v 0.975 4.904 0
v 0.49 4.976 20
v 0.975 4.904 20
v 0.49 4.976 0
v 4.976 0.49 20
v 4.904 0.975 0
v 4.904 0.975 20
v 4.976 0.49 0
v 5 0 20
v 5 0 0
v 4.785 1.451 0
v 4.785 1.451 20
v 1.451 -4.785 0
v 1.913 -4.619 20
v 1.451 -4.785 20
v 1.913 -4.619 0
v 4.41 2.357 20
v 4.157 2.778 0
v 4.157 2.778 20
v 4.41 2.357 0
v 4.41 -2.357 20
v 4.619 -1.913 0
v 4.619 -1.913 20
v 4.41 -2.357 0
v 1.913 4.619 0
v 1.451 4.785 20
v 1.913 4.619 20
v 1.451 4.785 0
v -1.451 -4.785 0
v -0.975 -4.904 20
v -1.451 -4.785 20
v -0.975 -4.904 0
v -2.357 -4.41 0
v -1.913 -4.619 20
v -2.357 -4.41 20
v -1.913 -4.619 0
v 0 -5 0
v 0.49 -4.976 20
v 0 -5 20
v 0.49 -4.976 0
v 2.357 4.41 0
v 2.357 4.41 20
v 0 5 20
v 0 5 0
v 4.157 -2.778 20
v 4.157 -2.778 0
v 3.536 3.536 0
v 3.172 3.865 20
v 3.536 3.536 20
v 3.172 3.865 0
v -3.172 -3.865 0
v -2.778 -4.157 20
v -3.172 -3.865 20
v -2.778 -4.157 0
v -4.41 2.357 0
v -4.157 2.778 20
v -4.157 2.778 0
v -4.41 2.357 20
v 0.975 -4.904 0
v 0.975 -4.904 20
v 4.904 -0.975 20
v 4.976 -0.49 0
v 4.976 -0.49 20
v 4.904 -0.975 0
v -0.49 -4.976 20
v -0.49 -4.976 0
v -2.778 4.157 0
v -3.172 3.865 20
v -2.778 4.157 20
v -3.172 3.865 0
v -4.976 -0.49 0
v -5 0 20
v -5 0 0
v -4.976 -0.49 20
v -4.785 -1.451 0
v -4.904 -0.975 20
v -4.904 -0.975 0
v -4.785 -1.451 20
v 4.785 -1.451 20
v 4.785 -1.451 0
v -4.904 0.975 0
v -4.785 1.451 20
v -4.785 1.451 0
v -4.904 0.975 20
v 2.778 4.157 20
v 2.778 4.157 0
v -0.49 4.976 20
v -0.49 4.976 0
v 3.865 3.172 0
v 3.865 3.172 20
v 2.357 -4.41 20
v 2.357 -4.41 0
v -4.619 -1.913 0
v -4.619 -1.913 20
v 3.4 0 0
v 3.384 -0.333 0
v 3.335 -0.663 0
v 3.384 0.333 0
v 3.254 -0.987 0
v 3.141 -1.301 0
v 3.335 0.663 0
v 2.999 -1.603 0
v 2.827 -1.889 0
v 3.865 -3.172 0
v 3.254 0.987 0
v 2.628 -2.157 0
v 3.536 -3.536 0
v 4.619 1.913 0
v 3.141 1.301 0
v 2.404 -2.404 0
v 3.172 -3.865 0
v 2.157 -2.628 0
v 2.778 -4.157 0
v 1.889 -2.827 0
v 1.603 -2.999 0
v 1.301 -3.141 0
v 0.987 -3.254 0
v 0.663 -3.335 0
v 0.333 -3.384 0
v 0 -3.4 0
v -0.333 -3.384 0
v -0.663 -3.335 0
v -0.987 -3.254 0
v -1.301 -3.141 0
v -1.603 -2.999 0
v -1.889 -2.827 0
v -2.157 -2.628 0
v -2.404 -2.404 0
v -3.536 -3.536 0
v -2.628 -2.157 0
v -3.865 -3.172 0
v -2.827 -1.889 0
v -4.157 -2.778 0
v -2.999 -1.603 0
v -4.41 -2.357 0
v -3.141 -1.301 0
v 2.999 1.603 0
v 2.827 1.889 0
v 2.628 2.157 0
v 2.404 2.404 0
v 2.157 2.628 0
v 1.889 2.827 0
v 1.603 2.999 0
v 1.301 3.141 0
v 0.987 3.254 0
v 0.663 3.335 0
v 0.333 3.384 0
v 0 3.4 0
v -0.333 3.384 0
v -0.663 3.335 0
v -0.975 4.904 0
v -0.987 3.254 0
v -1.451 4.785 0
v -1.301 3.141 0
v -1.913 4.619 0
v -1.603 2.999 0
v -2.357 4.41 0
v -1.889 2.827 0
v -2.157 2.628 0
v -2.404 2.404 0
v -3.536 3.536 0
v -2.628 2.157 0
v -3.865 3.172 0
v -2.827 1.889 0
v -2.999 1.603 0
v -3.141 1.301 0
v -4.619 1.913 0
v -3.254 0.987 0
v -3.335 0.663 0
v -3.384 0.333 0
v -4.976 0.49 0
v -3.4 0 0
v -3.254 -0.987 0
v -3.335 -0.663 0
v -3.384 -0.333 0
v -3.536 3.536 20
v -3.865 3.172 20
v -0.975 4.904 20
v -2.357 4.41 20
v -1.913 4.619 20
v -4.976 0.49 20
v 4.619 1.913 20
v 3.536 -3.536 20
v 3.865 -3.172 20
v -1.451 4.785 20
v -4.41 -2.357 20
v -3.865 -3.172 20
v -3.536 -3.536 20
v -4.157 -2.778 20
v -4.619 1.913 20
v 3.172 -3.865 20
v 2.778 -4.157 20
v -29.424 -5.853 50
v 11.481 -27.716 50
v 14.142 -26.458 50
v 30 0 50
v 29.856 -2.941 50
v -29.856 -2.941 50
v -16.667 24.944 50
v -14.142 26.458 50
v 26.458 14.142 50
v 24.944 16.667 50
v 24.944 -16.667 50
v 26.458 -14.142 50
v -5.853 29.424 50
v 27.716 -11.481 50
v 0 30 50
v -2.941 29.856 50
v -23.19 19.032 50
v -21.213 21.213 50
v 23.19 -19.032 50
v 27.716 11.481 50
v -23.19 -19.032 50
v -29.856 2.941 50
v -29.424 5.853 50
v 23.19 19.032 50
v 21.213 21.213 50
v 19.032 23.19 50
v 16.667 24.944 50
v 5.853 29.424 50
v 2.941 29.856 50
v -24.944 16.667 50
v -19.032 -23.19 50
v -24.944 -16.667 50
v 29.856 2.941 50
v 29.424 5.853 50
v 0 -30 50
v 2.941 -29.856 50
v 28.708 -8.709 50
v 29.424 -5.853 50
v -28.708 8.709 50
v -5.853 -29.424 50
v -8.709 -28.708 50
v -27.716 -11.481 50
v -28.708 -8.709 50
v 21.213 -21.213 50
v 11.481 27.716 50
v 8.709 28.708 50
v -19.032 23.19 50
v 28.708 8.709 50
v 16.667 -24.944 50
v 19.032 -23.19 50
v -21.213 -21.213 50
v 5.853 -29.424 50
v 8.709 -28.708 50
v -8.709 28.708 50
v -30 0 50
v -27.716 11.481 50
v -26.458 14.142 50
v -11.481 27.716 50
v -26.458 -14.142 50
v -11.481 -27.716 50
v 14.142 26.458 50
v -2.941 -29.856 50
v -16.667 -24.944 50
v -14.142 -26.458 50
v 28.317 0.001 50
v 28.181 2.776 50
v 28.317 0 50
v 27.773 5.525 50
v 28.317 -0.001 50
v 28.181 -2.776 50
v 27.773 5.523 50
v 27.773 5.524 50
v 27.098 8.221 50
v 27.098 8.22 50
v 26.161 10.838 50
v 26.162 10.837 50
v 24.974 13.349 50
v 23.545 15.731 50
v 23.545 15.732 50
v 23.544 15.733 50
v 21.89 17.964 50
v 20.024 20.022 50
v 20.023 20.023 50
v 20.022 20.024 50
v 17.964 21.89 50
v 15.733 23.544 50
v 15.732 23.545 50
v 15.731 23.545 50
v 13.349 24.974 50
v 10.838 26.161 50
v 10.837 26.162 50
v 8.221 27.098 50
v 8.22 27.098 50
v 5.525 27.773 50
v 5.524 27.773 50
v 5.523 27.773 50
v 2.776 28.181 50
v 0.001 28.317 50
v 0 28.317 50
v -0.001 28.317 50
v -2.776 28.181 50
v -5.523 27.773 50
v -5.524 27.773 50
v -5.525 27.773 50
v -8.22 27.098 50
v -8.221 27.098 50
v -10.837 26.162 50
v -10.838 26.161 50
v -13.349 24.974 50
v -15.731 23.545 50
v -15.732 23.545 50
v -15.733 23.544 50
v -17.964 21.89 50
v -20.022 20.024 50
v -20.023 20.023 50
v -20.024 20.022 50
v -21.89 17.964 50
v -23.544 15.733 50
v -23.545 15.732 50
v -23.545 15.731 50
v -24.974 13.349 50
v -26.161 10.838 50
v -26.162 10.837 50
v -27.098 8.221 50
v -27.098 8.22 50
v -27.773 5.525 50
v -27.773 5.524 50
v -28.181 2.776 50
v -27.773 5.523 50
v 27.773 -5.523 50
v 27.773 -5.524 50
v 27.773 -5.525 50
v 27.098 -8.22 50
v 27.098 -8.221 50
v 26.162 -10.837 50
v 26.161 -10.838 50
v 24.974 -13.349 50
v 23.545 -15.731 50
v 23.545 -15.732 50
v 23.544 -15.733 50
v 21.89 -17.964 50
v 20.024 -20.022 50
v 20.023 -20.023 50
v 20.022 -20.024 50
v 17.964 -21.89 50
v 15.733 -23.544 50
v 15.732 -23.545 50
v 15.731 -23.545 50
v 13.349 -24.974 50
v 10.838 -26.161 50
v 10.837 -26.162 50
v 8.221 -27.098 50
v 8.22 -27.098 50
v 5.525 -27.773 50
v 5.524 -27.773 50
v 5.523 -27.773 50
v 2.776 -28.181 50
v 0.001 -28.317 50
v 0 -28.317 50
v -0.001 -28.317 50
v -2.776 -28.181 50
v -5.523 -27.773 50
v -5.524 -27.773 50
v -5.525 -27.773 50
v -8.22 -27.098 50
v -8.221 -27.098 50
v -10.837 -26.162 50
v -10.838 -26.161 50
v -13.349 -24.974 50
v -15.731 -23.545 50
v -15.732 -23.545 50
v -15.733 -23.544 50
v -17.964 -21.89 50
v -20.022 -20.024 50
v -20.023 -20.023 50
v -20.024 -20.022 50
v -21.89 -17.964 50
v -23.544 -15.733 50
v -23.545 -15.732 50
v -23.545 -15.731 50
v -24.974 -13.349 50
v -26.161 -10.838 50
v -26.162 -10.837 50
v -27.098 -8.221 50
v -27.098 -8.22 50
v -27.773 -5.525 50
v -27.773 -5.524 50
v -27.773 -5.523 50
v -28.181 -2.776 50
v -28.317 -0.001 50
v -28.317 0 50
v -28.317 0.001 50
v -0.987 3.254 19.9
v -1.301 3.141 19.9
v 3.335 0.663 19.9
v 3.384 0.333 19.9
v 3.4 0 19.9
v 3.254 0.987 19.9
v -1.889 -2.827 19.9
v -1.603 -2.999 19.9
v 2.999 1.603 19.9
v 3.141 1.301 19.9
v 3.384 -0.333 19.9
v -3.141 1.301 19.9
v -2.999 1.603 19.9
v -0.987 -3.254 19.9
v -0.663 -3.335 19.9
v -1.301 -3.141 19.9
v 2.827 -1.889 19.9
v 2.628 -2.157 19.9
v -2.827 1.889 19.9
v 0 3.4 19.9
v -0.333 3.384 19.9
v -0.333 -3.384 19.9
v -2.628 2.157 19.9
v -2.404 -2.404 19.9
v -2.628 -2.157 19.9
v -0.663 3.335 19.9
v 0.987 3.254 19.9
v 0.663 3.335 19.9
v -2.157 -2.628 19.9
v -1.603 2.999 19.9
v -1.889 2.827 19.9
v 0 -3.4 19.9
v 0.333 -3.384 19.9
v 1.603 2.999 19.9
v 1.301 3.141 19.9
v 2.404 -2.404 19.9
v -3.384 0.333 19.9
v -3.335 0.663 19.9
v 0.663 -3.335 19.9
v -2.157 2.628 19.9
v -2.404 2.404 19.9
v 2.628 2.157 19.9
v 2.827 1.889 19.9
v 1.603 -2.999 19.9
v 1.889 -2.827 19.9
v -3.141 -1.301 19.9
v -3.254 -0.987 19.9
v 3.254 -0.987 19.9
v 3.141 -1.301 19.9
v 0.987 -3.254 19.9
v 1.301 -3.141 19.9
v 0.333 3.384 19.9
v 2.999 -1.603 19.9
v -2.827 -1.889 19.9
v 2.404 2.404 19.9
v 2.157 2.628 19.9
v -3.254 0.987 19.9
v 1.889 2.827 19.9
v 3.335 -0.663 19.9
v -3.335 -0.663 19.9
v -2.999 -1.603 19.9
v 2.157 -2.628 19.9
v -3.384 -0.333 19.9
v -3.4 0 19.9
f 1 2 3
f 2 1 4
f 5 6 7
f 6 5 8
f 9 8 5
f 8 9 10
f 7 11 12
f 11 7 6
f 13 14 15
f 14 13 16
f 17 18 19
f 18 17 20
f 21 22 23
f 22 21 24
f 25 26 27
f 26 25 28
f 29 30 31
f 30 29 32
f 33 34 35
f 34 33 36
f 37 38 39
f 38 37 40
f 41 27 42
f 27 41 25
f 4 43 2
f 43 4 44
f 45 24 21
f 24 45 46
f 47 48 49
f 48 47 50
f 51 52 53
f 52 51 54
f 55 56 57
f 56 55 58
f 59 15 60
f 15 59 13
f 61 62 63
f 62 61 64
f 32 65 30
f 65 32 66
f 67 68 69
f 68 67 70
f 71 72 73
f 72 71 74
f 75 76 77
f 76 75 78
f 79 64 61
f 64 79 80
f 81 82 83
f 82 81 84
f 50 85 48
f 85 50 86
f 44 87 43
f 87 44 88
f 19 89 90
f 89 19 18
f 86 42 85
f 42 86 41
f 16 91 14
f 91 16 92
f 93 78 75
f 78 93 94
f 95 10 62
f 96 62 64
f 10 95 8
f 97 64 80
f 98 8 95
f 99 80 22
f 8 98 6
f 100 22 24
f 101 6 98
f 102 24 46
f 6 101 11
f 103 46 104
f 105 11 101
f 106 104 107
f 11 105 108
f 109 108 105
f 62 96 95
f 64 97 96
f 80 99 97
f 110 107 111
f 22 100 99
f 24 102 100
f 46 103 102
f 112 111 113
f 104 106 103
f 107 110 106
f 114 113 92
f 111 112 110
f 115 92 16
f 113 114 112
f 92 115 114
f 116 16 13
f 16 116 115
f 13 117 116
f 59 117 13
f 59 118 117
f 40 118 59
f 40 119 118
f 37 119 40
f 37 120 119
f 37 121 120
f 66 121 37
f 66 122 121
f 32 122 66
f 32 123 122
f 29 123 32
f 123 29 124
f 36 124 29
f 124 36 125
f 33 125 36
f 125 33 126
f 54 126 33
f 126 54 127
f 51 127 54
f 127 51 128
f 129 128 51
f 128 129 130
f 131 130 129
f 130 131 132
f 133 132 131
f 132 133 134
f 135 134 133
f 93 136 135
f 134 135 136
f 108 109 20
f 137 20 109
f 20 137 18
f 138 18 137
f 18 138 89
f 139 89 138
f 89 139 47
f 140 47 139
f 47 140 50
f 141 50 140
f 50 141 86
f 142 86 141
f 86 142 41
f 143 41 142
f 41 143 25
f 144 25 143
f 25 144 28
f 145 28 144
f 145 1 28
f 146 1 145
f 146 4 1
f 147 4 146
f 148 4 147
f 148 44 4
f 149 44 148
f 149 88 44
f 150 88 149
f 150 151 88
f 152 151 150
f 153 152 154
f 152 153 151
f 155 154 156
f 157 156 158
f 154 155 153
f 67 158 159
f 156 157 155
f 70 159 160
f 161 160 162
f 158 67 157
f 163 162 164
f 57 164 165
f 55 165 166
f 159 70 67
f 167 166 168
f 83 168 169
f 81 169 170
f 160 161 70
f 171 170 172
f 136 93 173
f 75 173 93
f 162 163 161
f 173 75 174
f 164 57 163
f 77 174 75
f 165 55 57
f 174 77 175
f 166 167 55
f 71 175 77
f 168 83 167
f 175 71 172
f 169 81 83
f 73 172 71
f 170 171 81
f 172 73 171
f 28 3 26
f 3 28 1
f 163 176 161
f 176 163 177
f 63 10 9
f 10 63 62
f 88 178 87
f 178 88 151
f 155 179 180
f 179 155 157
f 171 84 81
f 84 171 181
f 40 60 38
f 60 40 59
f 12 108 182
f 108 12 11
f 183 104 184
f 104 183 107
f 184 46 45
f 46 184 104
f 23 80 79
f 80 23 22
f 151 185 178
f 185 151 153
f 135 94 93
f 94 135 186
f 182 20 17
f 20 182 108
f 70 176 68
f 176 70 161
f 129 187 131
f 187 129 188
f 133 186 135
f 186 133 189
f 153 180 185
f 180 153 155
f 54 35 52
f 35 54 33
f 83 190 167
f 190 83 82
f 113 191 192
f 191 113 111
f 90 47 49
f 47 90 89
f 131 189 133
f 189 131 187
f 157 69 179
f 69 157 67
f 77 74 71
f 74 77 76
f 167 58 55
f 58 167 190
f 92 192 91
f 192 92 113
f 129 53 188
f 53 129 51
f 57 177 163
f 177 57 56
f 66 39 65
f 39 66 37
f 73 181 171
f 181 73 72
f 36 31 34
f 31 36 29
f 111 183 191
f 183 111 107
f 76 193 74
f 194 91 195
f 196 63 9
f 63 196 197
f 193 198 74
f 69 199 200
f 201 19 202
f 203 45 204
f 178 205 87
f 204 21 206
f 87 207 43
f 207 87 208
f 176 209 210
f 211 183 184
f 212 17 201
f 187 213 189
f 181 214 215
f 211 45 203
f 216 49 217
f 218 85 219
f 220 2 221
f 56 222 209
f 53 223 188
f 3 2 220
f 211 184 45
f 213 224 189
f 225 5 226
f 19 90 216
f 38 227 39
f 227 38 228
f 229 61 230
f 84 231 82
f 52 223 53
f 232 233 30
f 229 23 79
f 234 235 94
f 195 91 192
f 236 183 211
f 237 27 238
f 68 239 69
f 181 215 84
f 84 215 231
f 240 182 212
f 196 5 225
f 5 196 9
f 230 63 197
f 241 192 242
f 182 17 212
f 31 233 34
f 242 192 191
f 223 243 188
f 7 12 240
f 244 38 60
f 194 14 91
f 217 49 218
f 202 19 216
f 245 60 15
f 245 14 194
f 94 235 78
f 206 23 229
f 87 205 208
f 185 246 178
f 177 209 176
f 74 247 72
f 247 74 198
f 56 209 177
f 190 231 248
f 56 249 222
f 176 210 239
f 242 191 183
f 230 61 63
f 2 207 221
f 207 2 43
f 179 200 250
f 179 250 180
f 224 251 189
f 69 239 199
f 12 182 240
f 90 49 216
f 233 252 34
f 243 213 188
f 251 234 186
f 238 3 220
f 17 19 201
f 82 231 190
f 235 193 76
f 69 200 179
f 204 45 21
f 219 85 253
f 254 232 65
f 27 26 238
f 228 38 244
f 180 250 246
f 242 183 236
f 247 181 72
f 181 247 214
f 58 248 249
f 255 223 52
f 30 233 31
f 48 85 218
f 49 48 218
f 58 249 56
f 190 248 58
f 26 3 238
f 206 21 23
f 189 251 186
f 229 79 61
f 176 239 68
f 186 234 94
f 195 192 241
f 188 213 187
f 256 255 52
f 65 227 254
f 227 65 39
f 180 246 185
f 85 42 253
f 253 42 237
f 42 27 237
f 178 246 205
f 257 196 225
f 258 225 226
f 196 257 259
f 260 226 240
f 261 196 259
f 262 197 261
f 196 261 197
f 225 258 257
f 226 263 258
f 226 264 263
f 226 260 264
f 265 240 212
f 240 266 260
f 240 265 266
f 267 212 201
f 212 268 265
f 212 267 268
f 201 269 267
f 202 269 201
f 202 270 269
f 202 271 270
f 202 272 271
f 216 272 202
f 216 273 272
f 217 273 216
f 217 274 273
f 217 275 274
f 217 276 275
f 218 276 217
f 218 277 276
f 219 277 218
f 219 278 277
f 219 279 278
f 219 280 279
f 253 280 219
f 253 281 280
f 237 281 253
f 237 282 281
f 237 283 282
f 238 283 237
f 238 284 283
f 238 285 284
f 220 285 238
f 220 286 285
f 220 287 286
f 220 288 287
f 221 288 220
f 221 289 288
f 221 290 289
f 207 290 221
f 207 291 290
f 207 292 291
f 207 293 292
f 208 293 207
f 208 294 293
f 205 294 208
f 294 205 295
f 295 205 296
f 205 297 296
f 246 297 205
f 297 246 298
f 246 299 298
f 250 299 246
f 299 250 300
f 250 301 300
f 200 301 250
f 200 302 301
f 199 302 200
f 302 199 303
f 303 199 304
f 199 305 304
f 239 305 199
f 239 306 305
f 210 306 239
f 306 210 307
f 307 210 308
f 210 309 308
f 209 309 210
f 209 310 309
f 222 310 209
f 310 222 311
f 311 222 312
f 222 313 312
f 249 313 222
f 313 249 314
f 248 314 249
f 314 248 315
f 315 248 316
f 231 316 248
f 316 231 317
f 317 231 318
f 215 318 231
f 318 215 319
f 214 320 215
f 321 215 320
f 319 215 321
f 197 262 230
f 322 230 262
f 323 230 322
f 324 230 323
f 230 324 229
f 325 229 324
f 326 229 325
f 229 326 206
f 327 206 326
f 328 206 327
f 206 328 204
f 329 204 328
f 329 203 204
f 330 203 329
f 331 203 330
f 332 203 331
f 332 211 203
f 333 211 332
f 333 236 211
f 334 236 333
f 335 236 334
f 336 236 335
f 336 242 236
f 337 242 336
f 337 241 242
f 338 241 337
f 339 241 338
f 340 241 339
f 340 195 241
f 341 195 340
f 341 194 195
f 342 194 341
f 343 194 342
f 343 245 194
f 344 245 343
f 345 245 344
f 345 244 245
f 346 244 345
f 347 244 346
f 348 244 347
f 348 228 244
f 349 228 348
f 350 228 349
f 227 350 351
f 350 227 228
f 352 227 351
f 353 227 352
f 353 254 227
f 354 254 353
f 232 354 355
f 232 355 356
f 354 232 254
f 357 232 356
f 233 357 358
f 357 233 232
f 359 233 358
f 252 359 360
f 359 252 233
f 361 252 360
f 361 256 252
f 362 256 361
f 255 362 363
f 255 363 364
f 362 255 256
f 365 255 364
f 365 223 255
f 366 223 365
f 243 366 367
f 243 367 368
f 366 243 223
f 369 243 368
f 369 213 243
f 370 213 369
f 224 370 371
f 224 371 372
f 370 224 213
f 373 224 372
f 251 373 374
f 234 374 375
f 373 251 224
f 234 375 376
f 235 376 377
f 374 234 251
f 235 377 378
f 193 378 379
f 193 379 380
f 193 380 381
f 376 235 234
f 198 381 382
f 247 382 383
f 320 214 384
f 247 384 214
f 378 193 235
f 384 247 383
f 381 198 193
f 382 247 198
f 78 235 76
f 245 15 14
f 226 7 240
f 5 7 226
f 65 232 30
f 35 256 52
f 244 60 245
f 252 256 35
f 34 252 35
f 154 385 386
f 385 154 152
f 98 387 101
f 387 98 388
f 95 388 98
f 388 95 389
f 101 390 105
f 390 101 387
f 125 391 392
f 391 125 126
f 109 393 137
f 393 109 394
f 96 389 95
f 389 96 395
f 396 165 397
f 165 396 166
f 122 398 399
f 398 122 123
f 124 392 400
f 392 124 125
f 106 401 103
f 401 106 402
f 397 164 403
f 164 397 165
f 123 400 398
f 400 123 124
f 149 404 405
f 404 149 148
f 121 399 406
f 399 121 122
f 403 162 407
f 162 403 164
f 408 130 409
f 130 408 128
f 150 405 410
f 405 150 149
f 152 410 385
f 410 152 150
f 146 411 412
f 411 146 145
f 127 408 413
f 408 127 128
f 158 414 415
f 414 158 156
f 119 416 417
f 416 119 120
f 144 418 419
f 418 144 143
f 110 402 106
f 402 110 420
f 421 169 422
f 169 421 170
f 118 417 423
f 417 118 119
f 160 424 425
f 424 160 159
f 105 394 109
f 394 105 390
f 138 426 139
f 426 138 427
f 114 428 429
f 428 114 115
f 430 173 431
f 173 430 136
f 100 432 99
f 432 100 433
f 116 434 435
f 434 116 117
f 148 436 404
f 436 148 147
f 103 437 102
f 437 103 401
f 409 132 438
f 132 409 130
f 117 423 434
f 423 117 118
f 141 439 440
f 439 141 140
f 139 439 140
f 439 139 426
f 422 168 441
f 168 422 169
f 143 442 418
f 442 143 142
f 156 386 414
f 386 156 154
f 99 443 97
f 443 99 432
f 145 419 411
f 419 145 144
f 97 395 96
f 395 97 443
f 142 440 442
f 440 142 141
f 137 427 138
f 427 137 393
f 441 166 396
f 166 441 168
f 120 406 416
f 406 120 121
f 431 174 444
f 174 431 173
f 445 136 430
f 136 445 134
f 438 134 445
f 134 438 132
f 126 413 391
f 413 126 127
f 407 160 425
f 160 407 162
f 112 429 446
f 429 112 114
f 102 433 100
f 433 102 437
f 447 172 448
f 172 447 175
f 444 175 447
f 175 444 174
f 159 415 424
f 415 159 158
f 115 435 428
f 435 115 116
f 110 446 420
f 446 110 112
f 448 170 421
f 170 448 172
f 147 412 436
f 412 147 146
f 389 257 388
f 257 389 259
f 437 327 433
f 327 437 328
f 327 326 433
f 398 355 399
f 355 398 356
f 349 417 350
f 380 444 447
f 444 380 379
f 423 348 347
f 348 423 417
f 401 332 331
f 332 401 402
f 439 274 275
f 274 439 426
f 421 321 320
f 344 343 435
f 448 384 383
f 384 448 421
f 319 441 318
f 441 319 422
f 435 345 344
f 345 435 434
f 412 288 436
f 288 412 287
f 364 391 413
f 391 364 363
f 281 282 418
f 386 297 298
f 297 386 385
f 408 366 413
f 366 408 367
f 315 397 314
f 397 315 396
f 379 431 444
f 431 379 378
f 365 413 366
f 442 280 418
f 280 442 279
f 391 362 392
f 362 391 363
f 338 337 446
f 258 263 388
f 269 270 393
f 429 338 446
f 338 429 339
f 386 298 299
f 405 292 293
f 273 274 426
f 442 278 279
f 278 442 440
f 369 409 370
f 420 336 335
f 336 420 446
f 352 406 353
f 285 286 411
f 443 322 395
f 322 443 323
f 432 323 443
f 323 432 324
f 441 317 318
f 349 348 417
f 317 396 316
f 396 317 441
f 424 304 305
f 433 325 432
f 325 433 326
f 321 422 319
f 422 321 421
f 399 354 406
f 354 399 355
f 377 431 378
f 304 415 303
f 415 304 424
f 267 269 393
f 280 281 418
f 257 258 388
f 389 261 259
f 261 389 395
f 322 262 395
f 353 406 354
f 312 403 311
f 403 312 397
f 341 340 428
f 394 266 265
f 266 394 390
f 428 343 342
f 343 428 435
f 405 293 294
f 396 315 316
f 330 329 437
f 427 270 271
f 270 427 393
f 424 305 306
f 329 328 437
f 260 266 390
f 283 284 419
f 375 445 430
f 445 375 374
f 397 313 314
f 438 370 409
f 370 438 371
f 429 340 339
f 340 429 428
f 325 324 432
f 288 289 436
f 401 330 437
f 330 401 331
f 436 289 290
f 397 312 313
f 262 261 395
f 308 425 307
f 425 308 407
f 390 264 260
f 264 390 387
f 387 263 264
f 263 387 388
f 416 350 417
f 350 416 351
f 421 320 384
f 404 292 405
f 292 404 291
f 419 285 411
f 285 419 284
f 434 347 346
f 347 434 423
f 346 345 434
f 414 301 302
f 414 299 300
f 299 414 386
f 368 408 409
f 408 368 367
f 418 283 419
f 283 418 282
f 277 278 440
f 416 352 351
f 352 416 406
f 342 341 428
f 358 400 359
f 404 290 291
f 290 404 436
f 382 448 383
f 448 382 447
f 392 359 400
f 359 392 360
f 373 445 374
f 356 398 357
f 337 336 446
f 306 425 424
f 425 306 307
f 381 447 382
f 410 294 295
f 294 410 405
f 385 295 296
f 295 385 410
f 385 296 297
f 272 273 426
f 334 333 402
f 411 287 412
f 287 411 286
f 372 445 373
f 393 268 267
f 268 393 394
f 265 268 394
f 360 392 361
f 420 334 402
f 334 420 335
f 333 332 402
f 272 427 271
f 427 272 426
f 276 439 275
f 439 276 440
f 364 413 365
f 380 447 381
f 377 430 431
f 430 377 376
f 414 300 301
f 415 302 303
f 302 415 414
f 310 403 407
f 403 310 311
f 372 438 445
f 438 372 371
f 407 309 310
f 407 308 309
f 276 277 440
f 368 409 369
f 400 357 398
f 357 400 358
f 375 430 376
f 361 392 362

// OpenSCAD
// Parameters (mm)
outer_d_spout = 10;          // outer diameter of the straight spout
outer_d_cone_top = 60;       // outer diameter at the funnel rim
height_spout = 20;           // height of the straight spout
height_cone = 30;            // height of the conical section (20 mm → 50 mm total)
wall_thickness = 1.6;        // uniform wall thickness
extra = 0.1;                 // clearance for cutting shapes (extends beyond faces)

// Derived inner diameters (mm)
inner_d_spout = outer_d_spout - 2*wall_thickness;          // bore of the spout
inner_d_cone_top = outer_d_cone_top - 2*wall_thickness;   // inner diameter at the rim

// Global resolution for curved features
$fn = 64;

// Outer solid (spout + cone)
module outer_funnel() {
    union() {
        // Straight spout (outer cylinder)
        cylinder(h = height_spout,
                 r = outer_d_spout/2);
        // Conical section (outer frustum) shifted to start at the spout top
        translate([0, 0, height_spout])
            cylinder(h = height_cone,
                     r1 = outer_d_spout/2,
                     r2 = outer_d_cone_top/2);
    }
}

// Inner bore (cylinder + cone) – extended slightly beyond the outer faces
module inner_bore() {
    union() {
        // Spout bore (cylinder) extending -extra below z=0 and +extra above its top
        translate([0, 0, -extra])
            cylinder(h = height_spout + 2*extra,
                     r = inner_d_spout/2);
        // Conical bore (frustum) extending -extra below its start (z=height_spout) and +extra above its top (z=height_spout+height_cone)
        translate([0, 0, height_spout - extra])
            cylinder(h = height_cone + 2*extra,
                     r1 = inner_d_spout/2,
                     r2 = inner_d_cone_top/2);
    }
}

// Final part: outer shape minus inner bore
difference() {
    outer_funnel();
    inner_bore();
}
